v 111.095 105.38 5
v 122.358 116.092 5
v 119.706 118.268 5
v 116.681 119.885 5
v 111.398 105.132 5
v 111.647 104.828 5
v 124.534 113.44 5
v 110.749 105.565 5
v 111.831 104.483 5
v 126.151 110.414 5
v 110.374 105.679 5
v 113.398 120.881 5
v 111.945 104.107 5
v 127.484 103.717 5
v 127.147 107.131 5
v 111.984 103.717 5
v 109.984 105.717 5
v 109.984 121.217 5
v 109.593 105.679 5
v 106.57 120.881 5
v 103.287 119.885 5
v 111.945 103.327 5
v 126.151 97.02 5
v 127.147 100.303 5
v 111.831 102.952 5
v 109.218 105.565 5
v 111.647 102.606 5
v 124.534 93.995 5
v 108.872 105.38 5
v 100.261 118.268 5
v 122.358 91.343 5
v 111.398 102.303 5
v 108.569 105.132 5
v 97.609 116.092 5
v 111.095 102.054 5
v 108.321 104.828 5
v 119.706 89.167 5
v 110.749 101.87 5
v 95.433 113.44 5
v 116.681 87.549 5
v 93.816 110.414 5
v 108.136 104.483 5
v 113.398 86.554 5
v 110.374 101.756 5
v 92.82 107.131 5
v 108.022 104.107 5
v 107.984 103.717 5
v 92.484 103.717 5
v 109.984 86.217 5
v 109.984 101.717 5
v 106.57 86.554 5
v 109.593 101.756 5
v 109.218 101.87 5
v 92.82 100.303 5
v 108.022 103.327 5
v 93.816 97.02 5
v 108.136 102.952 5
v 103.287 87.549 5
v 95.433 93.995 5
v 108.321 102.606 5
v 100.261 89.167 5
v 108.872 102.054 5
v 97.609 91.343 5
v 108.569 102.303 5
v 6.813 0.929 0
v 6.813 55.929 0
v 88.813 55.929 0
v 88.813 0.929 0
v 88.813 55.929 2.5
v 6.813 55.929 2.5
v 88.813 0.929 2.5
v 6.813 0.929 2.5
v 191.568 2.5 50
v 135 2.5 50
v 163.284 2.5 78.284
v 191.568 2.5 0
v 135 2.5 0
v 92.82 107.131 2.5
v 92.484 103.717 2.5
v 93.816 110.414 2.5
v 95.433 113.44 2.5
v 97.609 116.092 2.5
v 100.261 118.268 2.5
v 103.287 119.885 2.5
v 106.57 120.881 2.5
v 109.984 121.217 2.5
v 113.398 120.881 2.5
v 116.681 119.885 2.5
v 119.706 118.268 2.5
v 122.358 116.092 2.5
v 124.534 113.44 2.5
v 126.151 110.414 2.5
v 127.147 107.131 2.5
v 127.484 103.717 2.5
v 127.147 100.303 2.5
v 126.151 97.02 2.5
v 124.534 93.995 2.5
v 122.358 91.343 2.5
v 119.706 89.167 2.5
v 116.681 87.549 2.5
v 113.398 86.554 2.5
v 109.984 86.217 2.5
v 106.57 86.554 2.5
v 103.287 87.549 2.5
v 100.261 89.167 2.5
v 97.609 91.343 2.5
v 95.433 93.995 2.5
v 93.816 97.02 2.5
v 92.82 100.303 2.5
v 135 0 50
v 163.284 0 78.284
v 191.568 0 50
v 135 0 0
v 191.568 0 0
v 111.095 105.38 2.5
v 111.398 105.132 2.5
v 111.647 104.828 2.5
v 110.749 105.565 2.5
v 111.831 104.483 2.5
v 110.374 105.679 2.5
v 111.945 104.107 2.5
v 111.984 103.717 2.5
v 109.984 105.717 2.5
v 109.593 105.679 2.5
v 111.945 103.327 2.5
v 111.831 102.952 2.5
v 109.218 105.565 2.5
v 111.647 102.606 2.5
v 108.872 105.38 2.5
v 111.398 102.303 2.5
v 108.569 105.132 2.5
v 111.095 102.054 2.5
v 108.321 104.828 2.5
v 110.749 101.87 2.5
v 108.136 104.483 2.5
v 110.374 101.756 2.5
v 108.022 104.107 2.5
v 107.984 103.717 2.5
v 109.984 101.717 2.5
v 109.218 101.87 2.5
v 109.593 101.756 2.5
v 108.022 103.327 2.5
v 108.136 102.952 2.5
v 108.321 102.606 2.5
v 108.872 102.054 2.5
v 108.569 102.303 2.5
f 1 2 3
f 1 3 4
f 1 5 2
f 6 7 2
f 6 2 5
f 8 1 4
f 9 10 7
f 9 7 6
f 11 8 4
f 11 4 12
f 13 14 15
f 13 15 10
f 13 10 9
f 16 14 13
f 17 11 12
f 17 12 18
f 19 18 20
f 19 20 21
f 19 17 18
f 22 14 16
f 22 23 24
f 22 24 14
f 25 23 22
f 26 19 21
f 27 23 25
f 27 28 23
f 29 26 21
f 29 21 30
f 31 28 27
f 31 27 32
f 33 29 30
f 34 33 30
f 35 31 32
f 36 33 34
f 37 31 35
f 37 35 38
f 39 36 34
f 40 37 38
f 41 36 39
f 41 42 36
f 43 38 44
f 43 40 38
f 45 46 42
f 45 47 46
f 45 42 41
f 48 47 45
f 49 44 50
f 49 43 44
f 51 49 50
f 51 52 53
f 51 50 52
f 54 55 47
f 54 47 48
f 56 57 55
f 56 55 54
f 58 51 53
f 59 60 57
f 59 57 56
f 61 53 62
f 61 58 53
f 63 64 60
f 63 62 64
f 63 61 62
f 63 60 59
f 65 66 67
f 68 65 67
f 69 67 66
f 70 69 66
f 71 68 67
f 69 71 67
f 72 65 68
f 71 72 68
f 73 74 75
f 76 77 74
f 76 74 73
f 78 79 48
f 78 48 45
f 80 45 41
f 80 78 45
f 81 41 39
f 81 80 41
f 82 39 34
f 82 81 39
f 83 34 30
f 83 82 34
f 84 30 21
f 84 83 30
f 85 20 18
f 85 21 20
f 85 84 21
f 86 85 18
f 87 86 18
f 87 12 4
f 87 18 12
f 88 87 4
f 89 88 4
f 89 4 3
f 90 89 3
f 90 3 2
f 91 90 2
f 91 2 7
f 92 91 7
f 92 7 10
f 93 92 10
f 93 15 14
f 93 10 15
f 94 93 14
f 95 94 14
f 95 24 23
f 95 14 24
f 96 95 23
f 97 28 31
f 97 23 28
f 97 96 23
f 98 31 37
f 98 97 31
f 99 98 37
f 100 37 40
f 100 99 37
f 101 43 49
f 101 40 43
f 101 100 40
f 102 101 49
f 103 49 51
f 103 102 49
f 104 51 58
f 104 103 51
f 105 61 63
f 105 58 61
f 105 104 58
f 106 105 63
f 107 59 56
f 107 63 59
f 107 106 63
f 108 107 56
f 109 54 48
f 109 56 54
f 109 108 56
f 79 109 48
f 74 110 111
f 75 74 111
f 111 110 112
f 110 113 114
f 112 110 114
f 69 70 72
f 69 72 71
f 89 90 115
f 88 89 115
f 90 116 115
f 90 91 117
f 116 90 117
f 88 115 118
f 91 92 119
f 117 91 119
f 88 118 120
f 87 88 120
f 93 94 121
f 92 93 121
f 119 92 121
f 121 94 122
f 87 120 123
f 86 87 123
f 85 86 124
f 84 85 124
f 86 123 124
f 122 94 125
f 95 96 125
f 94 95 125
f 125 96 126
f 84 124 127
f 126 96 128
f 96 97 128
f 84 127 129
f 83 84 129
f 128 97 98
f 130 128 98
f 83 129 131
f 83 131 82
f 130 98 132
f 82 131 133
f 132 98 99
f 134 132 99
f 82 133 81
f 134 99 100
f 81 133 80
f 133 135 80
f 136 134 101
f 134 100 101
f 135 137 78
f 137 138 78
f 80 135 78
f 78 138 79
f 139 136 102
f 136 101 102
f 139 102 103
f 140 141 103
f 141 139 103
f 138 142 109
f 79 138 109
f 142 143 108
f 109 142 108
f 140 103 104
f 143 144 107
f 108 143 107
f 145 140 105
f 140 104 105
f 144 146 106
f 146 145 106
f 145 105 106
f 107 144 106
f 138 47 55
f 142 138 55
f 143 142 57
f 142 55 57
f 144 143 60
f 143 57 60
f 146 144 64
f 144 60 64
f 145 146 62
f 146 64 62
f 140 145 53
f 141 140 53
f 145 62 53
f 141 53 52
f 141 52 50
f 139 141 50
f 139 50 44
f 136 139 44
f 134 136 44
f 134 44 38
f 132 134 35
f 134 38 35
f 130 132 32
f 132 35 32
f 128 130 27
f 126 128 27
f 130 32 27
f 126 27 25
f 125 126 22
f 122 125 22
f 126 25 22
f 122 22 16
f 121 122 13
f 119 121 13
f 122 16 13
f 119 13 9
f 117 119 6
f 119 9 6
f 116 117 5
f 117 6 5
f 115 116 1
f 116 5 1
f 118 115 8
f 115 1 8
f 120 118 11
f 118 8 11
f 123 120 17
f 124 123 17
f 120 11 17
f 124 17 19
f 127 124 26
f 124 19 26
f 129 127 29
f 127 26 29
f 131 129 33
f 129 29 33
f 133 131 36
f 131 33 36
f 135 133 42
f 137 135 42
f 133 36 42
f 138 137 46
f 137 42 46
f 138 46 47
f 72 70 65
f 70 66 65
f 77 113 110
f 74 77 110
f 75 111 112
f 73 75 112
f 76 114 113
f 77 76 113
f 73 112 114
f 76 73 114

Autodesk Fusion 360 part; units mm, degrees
sketch "Sketch1" plane through (0, 0, 0) normal (0, 0, 1) x (1, 0, 0)
  line L0 (6.8128, 0.929) -> (88.8128, 0.929)
  line L1 (88.8128, 0.929) -> (88.8128, 55.929)
  line L2 (88.8128, 55.929) -> (6.8128, 55.929)
  line L3 (6.8128, 55.929) -> (6.8128, 0.929)
  dimension "d1" = 82
  dimension "d2" = 55
extrude "Extrude1" add sketch "Sketch1" along normal blind 2.5 makes body 1
sketch "Sketch2" plane through (0, 0, 2.5) normal (0, 0, 1) x (-1, 0, 0)
  line L0 (-6.8128, -55.929) -> (-6.8128, -0.929)
  line L1 (-6.8128, -0.929) -> (-88.8128, -0.929)
  line L2 (-88.8128, -0.929) -> (-88.8128, -55.929)
  line L3 (-88.8128, -55.929) -> (-6.8128, -55.929)
  circle A0 centre (-109.9836, -103.7173) radius 17.5
  dimension "d5" = 35
extrude "Extrude2" add sketch "Sketch2" along normal blind 2.5 separate body contours A0 makes body 2
sketch "Sketch3" plane through (0, 0, 5) normal (0, 0, 1) x (-1, 0, 0)
  circle A0 centre (-109.9836, -103.7173) radius 17.5
  circle A1 centre (-109.9836, -103.7173) radius 2
  dimension "d8" = 4
extrude "Extrude3" cut sketch "Sketch3" against normal blind 19 contours A1 bodies 2
sketch "Sketch4" plane through (0, 0, 0) normal (0, 1, 0) x (1, 0, 0)
  line L0 (135, 0) -> (135, -50)
  line L1 (135, -50) -> (163.2843, -78.2843)
  line L2 (135, -50) -> (175, -50) construction
  line L3 (163.2843, -78.2843) -> (191.5685, -50)
  line L4 (163.2843, -78.2843) -> (203.2843, -78.2843) construction
  line L5 (191.5685, -50) -> (191.5685, 0)
  line L6 (191.5685, 0) -> (135, 0)
  dimension "d11" = 50
  dimension "d12" = 40
  dimension "d13" = 45
  dimension "d14" = 45
  dimension "d15" = 40
  dimension "d16" = 50
extrude "Extrude4" add sketch "Sketch4" along normal blind 2.5 separate body makes body 3
